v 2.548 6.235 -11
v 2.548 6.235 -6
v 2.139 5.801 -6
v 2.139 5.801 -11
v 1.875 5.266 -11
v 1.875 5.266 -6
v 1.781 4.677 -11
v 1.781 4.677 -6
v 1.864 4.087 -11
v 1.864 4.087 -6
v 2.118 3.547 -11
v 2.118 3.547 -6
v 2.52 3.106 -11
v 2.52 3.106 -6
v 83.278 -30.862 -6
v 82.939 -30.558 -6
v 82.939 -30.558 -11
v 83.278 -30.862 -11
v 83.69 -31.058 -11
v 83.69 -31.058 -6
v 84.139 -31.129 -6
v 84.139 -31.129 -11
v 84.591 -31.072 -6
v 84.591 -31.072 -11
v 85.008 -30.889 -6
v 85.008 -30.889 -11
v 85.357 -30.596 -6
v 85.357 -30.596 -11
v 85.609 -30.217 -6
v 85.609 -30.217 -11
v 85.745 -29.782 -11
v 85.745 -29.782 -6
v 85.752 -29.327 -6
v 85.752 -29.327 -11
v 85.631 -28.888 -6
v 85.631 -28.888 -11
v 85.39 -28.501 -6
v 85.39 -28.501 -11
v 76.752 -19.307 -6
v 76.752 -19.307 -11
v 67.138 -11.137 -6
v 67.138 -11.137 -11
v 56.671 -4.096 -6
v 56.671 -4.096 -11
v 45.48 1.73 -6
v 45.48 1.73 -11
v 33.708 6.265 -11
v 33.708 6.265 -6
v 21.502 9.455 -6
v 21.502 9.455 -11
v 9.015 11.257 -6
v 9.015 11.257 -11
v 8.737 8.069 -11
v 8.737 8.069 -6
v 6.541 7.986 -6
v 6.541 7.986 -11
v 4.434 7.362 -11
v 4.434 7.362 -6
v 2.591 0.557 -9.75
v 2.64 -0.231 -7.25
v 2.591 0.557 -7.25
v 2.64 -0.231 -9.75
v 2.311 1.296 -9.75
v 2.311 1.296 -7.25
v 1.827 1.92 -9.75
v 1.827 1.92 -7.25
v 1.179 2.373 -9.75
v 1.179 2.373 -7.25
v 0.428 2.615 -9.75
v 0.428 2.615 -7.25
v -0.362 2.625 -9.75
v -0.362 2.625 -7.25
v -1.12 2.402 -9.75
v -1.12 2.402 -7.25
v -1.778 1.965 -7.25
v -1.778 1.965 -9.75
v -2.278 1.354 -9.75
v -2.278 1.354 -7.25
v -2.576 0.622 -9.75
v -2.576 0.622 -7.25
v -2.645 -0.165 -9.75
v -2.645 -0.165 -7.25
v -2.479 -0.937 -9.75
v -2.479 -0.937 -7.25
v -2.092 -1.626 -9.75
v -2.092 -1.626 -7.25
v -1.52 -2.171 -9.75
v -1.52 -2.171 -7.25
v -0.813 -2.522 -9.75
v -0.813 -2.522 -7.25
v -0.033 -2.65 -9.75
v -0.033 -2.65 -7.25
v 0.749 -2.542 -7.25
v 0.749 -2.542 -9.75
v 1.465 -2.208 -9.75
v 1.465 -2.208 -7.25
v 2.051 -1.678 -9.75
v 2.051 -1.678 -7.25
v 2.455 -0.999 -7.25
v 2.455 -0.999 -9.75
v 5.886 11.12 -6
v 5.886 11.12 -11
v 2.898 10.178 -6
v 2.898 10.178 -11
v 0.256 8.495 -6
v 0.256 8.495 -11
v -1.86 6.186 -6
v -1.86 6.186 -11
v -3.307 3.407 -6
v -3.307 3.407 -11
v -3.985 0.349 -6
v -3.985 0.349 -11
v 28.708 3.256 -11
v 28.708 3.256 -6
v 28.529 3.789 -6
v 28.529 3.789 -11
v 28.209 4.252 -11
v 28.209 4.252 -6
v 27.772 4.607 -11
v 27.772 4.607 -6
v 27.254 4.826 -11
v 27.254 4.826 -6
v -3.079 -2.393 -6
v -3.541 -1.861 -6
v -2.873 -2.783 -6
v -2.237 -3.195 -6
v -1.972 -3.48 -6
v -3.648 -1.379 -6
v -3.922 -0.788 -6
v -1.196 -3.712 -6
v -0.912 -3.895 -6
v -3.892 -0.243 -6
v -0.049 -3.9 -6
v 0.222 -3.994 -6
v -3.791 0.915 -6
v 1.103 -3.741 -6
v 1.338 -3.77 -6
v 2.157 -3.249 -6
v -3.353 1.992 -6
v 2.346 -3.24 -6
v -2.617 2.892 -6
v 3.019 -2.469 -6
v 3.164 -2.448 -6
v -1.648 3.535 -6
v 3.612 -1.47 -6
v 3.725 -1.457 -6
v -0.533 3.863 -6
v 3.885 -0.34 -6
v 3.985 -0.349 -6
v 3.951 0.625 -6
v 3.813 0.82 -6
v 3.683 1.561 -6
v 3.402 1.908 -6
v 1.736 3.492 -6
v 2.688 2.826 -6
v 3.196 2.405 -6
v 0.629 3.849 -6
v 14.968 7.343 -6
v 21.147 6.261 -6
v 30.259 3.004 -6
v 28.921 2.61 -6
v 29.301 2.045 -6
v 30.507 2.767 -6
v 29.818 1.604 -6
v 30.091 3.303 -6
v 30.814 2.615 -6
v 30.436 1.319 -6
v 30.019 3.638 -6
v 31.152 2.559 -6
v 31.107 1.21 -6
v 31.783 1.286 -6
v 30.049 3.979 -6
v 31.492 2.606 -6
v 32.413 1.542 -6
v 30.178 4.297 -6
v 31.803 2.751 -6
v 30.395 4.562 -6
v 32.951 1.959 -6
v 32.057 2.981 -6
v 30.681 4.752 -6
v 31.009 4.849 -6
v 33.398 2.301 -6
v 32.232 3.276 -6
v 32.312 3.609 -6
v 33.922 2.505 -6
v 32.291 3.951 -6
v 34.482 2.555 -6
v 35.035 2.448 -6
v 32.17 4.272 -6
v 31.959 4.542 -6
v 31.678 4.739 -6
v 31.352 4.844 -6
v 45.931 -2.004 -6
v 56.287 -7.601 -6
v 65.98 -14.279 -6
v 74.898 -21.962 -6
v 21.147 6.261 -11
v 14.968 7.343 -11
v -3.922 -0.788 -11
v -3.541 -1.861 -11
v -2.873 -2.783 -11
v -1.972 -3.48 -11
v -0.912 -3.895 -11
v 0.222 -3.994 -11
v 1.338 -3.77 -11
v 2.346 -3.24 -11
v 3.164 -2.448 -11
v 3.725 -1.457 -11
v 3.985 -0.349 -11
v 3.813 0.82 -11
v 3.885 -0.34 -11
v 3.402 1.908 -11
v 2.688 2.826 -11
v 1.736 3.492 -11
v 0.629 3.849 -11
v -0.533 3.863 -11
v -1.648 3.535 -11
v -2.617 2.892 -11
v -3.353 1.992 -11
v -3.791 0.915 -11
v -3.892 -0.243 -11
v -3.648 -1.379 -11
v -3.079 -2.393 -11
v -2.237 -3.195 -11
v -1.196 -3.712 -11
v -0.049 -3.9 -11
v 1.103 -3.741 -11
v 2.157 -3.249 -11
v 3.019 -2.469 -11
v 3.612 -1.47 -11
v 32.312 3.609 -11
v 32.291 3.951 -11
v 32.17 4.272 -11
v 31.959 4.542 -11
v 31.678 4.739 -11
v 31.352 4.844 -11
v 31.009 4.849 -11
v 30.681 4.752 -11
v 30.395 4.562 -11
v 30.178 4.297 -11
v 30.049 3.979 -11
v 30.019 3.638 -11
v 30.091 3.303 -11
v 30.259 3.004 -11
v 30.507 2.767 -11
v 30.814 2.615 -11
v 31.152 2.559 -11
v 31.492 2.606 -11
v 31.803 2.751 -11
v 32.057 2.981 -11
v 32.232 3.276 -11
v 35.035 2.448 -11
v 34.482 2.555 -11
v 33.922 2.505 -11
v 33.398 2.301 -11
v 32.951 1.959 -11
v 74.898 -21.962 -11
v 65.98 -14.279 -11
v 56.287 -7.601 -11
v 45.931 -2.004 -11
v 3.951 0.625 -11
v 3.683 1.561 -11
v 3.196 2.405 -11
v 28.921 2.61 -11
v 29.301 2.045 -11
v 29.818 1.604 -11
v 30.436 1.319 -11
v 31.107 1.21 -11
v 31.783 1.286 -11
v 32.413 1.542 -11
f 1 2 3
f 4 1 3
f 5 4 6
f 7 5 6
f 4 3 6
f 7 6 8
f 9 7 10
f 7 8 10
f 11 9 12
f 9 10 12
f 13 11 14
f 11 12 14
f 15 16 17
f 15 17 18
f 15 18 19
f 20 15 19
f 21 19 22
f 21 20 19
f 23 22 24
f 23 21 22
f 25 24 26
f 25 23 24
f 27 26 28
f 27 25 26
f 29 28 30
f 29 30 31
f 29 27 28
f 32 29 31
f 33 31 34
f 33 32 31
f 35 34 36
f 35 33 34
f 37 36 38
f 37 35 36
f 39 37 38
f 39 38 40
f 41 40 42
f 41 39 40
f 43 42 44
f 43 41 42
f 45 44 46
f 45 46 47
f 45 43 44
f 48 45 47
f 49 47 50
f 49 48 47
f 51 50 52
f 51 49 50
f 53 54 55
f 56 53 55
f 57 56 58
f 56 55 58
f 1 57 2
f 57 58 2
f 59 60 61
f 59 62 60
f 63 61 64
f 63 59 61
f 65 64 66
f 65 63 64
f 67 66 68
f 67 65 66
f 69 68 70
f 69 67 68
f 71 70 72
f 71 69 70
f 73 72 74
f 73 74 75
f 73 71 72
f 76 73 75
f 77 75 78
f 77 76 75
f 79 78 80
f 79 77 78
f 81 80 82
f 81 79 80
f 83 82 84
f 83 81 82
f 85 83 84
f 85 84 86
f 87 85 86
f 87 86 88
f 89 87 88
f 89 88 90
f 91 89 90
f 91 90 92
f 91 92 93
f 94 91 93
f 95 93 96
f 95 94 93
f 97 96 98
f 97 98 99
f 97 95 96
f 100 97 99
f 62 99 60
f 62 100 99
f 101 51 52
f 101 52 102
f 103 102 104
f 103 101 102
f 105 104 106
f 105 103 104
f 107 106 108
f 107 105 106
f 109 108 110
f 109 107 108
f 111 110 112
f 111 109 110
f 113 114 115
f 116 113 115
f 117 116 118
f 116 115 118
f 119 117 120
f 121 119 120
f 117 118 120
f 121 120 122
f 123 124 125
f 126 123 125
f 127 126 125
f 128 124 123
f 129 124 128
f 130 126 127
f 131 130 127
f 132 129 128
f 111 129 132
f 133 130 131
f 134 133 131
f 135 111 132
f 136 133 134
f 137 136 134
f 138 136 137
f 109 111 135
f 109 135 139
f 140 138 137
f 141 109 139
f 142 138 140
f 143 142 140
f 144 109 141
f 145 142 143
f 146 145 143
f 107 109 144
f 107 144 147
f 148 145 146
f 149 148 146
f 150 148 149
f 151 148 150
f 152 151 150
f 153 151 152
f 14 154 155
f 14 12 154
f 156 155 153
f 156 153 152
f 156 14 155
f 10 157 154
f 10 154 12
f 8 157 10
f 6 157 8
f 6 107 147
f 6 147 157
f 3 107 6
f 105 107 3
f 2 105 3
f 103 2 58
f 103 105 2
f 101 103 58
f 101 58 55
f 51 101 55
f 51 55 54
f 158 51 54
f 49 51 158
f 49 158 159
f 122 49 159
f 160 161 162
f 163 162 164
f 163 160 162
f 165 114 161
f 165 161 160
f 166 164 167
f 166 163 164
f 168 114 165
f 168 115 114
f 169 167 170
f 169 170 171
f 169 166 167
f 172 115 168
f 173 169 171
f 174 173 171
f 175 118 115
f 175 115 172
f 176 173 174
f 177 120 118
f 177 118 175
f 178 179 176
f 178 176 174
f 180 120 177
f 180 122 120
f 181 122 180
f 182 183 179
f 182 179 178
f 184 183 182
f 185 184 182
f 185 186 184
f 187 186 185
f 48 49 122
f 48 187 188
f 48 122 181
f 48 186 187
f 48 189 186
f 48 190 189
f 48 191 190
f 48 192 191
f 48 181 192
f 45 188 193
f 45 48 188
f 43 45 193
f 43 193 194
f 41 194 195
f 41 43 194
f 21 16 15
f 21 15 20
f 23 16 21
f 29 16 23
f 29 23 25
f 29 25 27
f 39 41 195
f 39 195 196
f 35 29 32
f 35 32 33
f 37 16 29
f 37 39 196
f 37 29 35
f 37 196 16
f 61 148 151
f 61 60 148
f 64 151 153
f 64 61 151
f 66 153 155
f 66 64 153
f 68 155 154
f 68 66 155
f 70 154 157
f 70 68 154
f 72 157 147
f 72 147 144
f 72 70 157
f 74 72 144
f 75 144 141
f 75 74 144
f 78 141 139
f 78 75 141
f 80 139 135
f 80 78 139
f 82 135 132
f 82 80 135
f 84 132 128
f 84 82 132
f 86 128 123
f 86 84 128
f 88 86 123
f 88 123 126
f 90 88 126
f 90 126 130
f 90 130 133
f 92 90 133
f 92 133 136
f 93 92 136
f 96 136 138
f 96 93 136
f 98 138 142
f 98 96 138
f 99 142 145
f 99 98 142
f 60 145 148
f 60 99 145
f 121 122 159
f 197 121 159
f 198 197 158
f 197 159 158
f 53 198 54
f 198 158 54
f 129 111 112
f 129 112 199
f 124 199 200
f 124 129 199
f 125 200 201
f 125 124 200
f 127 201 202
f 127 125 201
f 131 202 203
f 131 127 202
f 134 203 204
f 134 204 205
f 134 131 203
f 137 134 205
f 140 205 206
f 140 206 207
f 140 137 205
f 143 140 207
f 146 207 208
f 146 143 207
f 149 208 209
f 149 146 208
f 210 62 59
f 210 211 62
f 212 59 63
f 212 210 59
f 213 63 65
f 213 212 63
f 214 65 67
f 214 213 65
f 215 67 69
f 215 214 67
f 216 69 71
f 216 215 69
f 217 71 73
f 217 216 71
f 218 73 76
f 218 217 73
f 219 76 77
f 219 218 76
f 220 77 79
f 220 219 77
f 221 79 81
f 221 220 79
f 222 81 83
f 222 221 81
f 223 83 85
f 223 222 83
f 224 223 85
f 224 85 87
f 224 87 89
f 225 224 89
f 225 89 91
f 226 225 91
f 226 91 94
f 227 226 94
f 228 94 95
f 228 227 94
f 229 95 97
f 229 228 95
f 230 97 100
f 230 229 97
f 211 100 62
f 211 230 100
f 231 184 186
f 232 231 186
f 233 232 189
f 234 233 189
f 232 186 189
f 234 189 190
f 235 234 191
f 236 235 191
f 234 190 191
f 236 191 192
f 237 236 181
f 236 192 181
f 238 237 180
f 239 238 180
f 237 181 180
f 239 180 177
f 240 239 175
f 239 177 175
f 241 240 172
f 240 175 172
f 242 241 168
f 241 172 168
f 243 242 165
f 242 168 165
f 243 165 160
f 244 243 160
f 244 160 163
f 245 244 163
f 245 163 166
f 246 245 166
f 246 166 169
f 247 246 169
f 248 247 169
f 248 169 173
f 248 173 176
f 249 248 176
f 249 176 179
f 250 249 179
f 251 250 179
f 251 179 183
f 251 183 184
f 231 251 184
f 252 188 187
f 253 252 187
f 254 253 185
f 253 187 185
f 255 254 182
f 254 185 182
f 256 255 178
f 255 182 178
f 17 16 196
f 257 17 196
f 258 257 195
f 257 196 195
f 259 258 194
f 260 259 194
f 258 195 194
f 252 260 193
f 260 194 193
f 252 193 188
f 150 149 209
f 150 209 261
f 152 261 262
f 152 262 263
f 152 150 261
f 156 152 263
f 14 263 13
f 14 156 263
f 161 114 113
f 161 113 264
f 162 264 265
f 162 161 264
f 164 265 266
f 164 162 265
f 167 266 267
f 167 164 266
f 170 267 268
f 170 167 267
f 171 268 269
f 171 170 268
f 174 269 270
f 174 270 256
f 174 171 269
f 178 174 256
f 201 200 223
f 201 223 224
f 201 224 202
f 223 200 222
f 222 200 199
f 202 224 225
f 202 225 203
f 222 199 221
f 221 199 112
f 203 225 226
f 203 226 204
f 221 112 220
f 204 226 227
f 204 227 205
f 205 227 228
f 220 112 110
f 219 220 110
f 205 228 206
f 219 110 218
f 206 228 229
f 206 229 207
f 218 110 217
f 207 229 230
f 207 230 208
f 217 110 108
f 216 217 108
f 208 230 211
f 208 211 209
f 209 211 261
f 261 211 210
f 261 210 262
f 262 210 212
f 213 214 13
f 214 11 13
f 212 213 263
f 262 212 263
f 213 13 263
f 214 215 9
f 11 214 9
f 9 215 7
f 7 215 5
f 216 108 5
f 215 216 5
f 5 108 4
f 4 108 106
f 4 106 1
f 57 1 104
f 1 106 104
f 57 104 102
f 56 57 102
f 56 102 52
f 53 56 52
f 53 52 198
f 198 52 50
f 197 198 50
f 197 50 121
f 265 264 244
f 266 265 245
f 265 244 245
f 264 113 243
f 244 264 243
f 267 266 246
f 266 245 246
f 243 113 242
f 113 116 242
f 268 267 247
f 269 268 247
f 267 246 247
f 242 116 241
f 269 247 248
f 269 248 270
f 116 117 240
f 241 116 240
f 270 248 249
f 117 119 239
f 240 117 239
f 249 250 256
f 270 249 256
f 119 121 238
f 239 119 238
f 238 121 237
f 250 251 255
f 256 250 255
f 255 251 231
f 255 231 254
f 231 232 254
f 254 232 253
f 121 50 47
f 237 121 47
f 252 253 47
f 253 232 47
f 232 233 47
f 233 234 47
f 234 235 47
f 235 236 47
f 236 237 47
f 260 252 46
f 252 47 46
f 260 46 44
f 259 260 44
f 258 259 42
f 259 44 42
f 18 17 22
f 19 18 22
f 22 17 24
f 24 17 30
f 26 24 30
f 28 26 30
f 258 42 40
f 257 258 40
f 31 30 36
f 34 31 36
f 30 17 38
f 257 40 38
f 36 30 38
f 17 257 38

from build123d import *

# Parameters (mm, degrees)
PAD_DEPTH               = 5
SKETCH002_R             = 1.15
POCKET_DEPTH            = 5.001
POCKET_DEPTH_BACK       = 0.001
BODY001_PLACEMENT_ANGLE = 5


with BuildPart() as part:
    # Sketch → Pad (new body)
    with BuildSketch(Plane.XY):
        with BuildLine():
            ThreePointArc((-4, 0), (0, -4), (4, 0))
            ThreePointArc((4, 0), (3.532704, 1.876167), (2.239999, 3.313971))
            ThreePointArc((1.995291, 6.433002), (1.366125, 4.814525), (2.239999, 3.313971))
            ThreePointArc((8, 8.800007), (4.772802, 8.186896), (1.995291, 6.433002))
            ThreePointArc((26.730076, 7.183219), (17.399864, 8.39506), (8, 8.800007))
            ThreePointArc((28.315082, 5.745575), (27.73102, 6.694204), (26.730076, 7.183219))
            ThreePointArc((28.315082, 5.745575), (30.204969, 3.966171), (32.655215, 4.823051))
            ThreePointArc((34.687932, 5.491725), (33.574624, 5.452108), (32.655215, 4.823051))
            ThreePointArc((85.286771, -23.213222), (61.932163, -5.432587), (34.687932, 5.491725))
            ThreePointArc((85.286771, -23.213222), (87.549513, -23.213222), (87.549513, -20.95048))
            ThreePointArc((87.549513, -20.95048), (51.051886, 3.436454), (8, 12.000007))
            ThreePointArc((8, 12.000007), (-0.485282, 8.485284), (-4, 0))
        make_face()
    extrude(amount=-PAD_DEPTH)

    # Sketch002 → Pocket (cut, two sides)
    with BuildSketch(Plane.XY) as pocket_sk:
        with Locations((30.724748, 6.411535)):
            Circle(SKETCH002_R)
    extrude(amount=-POCKET_DEPTH, mode=Mode.SUBTRACT)
    extrude(pocket_sk.sketch, amount=POCKET_DEPTH_BACK, mode=Mode.SUBTRACT)

    # Sketch003 → Groove (revolve, cut)
    with BuildSketch(Plane.XZ):
        Polygon((0, 0), (3.9, 0), (2.65, -1.25), (2.65, -3.75), (3.9, -5), (0, -5), align=None)
    revolve(axis=Axis((0, 0, 0), (0, 0, 1)), mode=Mode.SUBTRACT)


with BuildPart() as part_1:
    # Body001 placement: moved
    add(part.part.moved(Location((0, 0, -6))).rotate(Axis((0, 0, -6), (0, 0, -1)), BODY001_PLACEMENT_ANGLE))


solid = part_1.part
